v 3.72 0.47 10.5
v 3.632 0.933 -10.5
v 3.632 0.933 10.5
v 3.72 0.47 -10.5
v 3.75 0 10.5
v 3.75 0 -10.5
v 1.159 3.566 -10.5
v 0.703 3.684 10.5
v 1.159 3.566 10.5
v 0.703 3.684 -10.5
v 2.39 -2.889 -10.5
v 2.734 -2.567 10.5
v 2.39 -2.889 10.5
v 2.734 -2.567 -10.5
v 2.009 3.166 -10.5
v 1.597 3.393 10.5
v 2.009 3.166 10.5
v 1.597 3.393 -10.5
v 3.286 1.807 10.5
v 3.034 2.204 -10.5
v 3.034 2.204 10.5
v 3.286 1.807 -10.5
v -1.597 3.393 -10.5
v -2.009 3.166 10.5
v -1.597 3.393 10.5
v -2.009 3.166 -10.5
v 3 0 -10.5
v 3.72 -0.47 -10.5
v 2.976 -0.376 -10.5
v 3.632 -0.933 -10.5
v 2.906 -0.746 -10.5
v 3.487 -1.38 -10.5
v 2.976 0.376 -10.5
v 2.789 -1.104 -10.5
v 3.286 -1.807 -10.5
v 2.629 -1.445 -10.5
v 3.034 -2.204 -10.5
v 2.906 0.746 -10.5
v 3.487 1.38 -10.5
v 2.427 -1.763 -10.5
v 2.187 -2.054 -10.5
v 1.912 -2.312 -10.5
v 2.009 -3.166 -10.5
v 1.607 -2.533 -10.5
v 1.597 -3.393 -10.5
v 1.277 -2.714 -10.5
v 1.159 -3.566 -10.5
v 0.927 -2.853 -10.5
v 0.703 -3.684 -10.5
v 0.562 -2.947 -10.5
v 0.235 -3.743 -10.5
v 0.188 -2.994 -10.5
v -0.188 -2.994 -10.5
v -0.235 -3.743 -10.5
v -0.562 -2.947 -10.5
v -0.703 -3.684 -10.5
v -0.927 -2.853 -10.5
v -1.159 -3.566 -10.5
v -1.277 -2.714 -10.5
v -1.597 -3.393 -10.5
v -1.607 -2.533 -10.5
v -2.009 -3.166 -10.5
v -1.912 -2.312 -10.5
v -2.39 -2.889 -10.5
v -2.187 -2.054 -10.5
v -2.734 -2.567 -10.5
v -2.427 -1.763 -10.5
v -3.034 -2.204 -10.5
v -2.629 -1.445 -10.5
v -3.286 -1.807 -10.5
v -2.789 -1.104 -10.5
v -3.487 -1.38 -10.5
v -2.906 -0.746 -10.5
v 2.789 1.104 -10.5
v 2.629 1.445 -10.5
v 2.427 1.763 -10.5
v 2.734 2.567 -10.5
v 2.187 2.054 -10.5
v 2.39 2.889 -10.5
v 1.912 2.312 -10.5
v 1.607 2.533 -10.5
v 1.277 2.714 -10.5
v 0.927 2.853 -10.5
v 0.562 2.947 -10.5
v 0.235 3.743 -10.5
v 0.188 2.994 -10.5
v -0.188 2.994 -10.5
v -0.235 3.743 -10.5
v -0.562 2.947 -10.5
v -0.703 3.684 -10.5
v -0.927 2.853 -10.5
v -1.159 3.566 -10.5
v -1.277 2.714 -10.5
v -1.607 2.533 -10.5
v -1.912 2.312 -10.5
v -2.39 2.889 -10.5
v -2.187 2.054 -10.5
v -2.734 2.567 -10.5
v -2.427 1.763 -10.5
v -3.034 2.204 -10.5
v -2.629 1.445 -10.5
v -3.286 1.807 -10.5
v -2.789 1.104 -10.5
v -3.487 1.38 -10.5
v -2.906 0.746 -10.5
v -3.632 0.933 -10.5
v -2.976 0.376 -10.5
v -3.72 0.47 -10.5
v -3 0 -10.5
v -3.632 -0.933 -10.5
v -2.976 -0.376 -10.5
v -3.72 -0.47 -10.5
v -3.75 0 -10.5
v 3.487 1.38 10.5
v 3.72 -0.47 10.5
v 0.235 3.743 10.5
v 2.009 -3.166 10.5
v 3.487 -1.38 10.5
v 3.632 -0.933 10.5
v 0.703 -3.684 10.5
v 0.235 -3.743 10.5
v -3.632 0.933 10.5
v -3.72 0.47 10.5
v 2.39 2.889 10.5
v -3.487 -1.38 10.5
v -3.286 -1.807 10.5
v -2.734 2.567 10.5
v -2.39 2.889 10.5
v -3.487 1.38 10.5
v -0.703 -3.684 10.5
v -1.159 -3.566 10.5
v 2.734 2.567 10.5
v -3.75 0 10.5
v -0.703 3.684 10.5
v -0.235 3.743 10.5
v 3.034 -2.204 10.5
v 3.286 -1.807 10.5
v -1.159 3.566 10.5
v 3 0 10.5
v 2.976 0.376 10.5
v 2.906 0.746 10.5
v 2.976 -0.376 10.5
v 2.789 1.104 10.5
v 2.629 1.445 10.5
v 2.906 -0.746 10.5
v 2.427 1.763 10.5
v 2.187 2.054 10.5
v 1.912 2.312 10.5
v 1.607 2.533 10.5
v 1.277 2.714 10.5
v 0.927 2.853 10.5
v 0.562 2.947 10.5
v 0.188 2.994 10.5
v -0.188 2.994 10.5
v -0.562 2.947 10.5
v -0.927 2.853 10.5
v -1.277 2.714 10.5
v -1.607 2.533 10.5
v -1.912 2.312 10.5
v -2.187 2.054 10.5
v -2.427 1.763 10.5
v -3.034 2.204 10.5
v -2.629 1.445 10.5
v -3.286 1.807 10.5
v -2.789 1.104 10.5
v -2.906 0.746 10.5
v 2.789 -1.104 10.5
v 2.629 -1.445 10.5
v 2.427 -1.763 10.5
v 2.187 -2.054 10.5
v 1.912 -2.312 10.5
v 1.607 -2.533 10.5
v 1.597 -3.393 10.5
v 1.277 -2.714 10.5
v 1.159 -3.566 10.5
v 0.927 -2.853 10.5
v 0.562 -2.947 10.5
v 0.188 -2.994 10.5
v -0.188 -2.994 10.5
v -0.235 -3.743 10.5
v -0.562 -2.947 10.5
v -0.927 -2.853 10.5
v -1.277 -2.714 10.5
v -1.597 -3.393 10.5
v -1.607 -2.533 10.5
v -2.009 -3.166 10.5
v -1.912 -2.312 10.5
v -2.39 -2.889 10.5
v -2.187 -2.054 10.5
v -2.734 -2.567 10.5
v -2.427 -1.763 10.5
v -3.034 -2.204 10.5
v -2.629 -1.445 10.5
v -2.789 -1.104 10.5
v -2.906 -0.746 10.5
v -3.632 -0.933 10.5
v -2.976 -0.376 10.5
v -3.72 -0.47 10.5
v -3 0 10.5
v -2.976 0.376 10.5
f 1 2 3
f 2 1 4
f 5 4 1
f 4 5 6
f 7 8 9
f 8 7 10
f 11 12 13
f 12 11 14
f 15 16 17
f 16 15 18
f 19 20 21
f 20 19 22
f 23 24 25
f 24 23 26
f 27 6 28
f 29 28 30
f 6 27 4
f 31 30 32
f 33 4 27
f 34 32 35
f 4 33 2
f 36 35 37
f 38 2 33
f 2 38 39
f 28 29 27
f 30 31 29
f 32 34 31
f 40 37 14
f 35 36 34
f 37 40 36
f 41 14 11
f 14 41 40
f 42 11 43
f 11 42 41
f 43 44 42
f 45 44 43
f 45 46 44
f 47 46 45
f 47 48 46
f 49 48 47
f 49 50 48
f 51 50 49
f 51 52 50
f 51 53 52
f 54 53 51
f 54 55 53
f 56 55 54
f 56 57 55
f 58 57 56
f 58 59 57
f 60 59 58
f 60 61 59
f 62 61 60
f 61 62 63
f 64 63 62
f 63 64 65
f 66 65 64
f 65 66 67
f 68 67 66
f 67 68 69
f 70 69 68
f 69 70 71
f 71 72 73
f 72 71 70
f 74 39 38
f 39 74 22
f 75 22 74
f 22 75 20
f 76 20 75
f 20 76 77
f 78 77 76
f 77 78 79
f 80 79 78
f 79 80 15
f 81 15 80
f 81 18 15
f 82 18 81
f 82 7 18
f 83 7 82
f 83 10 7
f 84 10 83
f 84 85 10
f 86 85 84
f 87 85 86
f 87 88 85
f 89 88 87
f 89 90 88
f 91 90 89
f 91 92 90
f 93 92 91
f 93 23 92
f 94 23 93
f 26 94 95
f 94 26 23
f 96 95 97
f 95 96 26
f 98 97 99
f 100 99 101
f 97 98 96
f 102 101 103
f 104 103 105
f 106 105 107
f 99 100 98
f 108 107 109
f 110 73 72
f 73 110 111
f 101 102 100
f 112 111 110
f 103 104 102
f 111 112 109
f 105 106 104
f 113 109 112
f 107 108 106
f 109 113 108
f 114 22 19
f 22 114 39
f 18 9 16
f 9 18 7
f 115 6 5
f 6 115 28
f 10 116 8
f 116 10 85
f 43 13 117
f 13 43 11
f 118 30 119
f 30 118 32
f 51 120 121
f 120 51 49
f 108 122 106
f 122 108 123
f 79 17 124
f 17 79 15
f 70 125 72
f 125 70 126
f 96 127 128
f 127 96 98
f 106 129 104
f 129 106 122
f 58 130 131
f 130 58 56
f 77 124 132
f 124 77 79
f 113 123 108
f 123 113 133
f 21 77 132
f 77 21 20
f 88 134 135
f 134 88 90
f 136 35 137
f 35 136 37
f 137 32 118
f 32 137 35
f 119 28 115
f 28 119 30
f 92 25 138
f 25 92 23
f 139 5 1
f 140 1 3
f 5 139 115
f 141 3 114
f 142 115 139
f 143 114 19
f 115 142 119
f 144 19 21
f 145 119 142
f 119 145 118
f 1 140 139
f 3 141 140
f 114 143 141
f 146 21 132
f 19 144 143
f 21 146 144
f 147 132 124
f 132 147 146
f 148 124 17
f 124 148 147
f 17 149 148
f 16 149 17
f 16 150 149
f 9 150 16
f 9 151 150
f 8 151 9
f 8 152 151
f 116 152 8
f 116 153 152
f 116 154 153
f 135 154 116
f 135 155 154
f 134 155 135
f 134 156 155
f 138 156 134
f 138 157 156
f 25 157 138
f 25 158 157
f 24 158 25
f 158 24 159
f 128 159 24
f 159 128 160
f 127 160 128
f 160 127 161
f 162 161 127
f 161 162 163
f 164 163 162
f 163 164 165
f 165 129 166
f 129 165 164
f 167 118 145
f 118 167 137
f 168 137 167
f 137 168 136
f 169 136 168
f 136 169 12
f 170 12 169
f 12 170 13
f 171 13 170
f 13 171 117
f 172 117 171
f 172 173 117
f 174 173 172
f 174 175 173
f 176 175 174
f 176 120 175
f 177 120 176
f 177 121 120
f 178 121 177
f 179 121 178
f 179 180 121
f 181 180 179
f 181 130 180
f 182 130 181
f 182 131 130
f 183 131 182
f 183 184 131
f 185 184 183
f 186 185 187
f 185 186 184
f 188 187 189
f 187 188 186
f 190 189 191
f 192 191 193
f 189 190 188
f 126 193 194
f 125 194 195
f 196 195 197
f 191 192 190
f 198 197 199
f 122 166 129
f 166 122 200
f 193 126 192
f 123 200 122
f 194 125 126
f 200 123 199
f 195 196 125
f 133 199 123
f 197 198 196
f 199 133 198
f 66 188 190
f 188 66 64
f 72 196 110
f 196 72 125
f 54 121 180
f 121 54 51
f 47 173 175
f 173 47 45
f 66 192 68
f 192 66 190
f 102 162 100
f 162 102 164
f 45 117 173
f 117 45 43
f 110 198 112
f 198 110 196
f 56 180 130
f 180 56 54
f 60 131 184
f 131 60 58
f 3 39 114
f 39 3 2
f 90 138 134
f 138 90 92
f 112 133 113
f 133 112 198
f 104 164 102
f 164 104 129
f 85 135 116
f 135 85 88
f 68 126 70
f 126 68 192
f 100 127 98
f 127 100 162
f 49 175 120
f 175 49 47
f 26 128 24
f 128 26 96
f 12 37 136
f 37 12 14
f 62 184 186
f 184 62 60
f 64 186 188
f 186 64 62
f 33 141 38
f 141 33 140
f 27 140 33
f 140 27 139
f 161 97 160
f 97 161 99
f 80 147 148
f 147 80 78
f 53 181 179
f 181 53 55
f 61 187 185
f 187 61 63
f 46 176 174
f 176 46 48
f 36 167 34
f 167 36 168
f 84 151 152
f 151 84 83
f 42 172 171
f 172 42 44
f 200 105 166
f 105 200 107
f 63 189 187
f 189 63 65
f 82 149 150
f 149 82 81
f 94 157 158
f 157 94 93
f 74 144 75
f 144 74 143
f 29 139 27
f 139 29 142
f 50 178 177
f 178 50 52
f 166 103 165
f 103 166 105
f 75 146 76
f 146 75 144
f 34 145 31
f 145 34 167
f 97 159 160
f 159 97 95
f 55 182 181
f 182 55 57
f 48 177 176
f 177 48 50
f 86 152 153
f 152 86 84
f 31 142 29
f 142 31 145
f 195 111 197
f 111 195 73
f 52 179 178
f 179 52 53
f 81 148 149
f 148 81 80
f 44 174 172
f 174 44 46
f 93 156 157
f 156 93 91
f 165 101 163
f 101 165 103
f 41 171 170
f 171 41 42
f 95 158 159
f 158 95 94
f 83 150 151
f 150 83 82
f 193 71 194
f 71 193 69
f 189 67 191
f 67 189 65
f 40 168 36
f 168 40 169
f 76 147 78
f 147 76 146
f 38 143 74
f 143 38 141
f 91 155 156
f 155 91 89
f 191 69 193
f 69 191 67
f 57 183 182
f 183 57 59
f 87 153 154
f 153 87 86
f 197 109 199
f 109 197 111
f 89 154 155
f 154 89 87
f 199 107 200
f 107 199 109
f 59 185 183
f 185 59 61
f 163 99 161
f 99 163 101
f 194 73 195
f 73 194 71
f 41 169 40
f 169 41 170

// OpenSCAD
$fn = 50;


difference() {
	union() {
		translate(v = [0, 0, -10.5000000000]) {
			cylinder(h = 21, r = 3.7500000000);
		}
	}
	union() {
		translate(v = [0, 0, -100.0000000000]) {
			cylinder(h = 200, r = 3.0000000000);
		}
	}
}
